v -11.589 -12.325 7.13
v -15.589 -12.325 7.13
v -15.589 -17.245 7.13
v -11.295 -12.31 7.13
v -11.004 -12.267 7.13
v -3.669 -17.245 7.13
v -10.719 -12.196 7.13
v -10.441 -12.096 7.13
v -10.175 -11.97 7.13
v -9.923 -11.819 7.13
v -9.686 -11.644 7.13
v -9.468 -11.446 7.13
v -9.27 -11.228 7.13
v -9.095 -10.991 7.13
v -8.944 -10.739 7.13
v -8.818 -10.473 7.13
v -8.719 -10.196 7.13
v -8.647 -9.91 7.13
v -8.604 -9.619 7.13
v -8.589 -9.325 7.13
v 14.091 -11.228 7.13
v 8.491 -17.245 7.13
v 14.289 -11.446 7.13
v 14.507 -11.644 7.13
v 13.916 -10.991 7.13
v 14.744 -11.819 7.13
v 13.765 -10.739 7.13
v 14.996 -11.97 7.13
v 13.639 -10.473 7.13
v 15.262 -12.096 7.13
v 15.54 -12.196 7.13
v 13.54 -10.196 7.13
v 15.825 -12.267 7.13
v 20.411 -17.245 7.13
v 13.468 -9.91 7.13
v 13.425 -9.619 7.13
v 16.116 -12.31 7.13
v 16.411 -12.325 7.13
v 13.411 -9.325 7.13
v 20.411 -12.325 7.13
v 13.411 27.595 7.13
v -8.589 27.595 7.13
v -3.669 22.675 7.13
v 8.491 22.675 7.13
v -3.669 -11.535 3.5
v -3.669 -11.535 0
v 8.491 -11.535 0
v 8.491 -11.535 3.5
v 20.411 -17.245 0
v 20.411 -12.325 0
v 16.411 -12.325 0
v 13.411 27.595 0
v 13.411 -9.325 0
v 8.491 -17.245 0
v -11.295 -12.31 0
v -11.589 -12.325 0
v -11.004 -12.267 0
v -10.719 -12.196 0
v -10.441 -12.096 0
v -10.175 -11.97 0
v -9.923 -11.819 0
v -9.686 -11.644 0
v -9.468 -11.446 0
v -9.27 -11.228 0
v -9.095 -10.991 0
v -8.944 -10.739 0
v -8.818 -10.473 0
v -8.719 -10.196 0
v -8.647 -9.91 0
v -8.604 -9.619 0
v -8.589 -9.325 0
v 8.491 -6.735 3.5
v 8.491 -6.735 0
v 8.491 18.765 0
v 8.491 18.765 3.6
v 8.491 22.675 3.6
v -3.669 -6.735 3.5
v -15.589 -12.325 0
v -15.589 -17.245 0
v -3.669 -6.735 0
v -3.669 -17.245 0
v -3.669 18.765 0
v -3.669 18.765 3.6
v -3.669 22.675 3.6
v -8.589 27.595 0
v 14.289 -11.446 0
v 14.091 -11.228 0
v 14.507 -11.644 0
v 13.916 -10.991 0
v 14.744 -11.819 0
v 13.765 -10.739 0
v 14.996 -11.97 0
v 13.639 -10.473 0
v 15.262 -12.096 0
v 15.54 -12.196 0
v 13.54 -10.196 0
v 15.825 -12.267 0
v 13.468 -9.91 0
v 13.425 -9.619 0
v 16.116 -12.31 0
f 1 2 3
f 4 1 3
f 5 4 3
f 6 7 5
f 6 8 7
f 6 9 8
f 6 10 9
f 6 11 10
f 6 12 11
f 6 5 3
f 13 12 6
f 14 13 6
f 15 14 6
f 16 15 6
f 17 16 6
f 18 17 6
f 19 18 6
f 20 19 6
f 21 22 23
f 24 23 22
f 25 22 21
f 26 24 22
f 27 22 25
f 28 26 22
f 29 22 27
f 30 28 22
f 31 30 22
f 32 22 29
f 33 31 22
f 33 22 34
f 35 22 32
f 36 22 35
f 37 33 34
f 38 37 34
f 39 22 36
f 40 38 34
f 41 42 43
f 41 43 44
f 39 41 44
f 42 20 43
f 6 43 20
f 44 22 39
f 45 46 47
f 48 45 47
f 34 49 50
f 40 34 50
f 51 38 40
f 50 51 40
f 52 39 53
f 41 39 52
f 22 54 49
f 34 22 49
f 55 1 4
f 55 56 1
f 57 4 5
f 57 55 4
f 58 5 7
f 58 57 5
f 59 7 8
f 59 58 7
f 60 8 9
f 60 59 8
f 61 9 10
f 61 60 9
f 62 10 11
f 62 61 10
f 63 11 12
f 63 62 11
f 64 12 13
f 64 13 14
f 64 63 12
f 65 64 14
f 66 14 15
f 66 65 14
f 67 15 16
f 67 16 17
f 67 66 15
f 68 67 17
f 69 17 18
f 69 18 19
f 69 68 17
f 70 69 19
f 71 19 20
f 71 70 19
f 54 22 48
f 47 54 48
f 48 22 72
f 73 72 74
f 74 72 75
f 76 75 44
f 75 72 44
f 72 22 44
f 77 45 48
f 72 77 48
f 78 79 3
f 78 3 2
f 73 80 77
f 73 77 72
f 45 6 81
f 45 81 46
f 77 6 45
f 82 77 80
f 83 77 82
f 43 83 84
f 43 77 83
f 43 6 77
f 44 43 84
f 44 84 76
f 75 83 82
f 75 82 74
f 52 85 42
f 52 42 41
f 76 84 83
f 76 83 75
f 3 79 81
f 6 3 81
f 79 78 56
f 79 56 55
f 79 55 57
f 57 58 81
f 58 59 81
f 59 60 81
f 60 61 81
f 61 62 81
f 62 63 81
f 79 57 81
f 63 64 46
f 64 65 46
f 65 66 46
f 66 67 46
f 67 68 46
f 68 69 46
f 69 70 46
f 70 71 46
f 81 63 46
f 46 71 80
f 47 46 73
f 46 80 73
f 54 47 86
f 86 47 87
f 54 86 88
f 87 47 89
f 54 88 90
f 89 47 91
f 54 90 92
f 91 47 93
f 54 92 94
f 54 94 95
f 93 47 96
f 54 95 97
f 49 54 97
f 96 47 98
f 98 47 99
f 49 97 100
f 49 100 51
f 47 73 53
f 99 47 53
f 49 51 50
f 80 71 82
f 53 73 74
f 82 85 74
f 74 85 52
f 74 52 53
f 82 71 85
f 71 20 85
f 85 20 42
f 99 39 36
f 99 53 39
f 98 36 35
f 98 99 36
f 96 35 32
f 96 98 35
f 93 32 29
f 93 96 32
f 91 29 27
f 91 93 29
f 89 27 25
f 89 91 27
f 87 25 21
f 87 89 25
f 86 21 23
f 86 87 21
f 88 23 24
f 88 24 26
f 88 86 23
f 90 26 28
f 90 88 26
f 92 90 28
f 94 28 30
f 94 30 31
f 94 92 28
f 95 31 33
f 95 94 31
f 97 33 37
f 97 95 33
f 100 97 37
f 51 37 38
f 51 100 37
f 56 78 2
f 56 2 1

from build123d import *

# Parameters (mm, degrees)
F0_W     = 36
F0_H     = 44.84
F1_DEPTH = 7.13
F2_W     = 7
F2_H     = 39.92
F3_DEPTH = 7.13
F4_W     = 12.16
F4_H     = 36.01
F5_DEPTH = 7.13
F6_W     = 12.16
F6_H     = 3.91
F7_DEPTH = 3.53
F8_W     = 12.16
F8_H     = 4.8
F9_DEPTH = 3.5
F10_R    = 3


with BuildPart() as f1:
    # F0 (on Top) → F1 (new body)
    with BuildSketch(Plane.XY):
        with Locations((2.410514, 5.175292)):
            Rectangle(F0_W, F0_H)
    extrude(amount=F1_DEPTH)

    # F2 (on face) → F3 (cut)
    with BuildSketch(Plane.XY.offset(7.13)):
        with Locations((-12.089486, 7.635292)):
            Rectangle(F2_W, F2_H)
        with Locations((16.910514, 7.635292)):
            Rectangle(F2_W, F2_H)
    extrude(amount=-F3_DEPTH, mode=Mode.SUBTRACT)

    # F4 (on face) → F5 (cut)
    with BuildSketch(Plane.XY.offset(7.13)):
        with Locations((2.410514, 0.760292)):
            Rectangle(F4_W, F4_H)
    extrude(amount=-F5_DEPTH, mode=Mode.SUBTRACT)

    # F6 (on face) → F7 (cut)
    with BuildSketch(Plane.XY.offset(7.13)):
        with Locations((2.410514, 20.720292)):
            Rectangle(F6_W, F6_H)
    extrude(amount=-F7_DEPTH, mode=Mode.SUBTRACT)

    # F8 (on face) → F9 (join)
    with BuildSketch(Plane(origin=(0, 0, 0), x_dir=(1, 0, 0), z_dir=(0, 0, -1))):
        with Locations((2.410514, 9.134708)):
            Rectangle(F8_W, F8_H)
    extrude(amount=-F9_DEPTH)

    # F10
    f10_edges = [f1.edges().sort_by_distance(p)[0] for p in [
        (13.410514, -12.324708, 3.565),
        (-8.589486, -12.324708, 3.565),
    ]]
    fillet(f10_edges, radius=F10_R)


solid = f1.part
